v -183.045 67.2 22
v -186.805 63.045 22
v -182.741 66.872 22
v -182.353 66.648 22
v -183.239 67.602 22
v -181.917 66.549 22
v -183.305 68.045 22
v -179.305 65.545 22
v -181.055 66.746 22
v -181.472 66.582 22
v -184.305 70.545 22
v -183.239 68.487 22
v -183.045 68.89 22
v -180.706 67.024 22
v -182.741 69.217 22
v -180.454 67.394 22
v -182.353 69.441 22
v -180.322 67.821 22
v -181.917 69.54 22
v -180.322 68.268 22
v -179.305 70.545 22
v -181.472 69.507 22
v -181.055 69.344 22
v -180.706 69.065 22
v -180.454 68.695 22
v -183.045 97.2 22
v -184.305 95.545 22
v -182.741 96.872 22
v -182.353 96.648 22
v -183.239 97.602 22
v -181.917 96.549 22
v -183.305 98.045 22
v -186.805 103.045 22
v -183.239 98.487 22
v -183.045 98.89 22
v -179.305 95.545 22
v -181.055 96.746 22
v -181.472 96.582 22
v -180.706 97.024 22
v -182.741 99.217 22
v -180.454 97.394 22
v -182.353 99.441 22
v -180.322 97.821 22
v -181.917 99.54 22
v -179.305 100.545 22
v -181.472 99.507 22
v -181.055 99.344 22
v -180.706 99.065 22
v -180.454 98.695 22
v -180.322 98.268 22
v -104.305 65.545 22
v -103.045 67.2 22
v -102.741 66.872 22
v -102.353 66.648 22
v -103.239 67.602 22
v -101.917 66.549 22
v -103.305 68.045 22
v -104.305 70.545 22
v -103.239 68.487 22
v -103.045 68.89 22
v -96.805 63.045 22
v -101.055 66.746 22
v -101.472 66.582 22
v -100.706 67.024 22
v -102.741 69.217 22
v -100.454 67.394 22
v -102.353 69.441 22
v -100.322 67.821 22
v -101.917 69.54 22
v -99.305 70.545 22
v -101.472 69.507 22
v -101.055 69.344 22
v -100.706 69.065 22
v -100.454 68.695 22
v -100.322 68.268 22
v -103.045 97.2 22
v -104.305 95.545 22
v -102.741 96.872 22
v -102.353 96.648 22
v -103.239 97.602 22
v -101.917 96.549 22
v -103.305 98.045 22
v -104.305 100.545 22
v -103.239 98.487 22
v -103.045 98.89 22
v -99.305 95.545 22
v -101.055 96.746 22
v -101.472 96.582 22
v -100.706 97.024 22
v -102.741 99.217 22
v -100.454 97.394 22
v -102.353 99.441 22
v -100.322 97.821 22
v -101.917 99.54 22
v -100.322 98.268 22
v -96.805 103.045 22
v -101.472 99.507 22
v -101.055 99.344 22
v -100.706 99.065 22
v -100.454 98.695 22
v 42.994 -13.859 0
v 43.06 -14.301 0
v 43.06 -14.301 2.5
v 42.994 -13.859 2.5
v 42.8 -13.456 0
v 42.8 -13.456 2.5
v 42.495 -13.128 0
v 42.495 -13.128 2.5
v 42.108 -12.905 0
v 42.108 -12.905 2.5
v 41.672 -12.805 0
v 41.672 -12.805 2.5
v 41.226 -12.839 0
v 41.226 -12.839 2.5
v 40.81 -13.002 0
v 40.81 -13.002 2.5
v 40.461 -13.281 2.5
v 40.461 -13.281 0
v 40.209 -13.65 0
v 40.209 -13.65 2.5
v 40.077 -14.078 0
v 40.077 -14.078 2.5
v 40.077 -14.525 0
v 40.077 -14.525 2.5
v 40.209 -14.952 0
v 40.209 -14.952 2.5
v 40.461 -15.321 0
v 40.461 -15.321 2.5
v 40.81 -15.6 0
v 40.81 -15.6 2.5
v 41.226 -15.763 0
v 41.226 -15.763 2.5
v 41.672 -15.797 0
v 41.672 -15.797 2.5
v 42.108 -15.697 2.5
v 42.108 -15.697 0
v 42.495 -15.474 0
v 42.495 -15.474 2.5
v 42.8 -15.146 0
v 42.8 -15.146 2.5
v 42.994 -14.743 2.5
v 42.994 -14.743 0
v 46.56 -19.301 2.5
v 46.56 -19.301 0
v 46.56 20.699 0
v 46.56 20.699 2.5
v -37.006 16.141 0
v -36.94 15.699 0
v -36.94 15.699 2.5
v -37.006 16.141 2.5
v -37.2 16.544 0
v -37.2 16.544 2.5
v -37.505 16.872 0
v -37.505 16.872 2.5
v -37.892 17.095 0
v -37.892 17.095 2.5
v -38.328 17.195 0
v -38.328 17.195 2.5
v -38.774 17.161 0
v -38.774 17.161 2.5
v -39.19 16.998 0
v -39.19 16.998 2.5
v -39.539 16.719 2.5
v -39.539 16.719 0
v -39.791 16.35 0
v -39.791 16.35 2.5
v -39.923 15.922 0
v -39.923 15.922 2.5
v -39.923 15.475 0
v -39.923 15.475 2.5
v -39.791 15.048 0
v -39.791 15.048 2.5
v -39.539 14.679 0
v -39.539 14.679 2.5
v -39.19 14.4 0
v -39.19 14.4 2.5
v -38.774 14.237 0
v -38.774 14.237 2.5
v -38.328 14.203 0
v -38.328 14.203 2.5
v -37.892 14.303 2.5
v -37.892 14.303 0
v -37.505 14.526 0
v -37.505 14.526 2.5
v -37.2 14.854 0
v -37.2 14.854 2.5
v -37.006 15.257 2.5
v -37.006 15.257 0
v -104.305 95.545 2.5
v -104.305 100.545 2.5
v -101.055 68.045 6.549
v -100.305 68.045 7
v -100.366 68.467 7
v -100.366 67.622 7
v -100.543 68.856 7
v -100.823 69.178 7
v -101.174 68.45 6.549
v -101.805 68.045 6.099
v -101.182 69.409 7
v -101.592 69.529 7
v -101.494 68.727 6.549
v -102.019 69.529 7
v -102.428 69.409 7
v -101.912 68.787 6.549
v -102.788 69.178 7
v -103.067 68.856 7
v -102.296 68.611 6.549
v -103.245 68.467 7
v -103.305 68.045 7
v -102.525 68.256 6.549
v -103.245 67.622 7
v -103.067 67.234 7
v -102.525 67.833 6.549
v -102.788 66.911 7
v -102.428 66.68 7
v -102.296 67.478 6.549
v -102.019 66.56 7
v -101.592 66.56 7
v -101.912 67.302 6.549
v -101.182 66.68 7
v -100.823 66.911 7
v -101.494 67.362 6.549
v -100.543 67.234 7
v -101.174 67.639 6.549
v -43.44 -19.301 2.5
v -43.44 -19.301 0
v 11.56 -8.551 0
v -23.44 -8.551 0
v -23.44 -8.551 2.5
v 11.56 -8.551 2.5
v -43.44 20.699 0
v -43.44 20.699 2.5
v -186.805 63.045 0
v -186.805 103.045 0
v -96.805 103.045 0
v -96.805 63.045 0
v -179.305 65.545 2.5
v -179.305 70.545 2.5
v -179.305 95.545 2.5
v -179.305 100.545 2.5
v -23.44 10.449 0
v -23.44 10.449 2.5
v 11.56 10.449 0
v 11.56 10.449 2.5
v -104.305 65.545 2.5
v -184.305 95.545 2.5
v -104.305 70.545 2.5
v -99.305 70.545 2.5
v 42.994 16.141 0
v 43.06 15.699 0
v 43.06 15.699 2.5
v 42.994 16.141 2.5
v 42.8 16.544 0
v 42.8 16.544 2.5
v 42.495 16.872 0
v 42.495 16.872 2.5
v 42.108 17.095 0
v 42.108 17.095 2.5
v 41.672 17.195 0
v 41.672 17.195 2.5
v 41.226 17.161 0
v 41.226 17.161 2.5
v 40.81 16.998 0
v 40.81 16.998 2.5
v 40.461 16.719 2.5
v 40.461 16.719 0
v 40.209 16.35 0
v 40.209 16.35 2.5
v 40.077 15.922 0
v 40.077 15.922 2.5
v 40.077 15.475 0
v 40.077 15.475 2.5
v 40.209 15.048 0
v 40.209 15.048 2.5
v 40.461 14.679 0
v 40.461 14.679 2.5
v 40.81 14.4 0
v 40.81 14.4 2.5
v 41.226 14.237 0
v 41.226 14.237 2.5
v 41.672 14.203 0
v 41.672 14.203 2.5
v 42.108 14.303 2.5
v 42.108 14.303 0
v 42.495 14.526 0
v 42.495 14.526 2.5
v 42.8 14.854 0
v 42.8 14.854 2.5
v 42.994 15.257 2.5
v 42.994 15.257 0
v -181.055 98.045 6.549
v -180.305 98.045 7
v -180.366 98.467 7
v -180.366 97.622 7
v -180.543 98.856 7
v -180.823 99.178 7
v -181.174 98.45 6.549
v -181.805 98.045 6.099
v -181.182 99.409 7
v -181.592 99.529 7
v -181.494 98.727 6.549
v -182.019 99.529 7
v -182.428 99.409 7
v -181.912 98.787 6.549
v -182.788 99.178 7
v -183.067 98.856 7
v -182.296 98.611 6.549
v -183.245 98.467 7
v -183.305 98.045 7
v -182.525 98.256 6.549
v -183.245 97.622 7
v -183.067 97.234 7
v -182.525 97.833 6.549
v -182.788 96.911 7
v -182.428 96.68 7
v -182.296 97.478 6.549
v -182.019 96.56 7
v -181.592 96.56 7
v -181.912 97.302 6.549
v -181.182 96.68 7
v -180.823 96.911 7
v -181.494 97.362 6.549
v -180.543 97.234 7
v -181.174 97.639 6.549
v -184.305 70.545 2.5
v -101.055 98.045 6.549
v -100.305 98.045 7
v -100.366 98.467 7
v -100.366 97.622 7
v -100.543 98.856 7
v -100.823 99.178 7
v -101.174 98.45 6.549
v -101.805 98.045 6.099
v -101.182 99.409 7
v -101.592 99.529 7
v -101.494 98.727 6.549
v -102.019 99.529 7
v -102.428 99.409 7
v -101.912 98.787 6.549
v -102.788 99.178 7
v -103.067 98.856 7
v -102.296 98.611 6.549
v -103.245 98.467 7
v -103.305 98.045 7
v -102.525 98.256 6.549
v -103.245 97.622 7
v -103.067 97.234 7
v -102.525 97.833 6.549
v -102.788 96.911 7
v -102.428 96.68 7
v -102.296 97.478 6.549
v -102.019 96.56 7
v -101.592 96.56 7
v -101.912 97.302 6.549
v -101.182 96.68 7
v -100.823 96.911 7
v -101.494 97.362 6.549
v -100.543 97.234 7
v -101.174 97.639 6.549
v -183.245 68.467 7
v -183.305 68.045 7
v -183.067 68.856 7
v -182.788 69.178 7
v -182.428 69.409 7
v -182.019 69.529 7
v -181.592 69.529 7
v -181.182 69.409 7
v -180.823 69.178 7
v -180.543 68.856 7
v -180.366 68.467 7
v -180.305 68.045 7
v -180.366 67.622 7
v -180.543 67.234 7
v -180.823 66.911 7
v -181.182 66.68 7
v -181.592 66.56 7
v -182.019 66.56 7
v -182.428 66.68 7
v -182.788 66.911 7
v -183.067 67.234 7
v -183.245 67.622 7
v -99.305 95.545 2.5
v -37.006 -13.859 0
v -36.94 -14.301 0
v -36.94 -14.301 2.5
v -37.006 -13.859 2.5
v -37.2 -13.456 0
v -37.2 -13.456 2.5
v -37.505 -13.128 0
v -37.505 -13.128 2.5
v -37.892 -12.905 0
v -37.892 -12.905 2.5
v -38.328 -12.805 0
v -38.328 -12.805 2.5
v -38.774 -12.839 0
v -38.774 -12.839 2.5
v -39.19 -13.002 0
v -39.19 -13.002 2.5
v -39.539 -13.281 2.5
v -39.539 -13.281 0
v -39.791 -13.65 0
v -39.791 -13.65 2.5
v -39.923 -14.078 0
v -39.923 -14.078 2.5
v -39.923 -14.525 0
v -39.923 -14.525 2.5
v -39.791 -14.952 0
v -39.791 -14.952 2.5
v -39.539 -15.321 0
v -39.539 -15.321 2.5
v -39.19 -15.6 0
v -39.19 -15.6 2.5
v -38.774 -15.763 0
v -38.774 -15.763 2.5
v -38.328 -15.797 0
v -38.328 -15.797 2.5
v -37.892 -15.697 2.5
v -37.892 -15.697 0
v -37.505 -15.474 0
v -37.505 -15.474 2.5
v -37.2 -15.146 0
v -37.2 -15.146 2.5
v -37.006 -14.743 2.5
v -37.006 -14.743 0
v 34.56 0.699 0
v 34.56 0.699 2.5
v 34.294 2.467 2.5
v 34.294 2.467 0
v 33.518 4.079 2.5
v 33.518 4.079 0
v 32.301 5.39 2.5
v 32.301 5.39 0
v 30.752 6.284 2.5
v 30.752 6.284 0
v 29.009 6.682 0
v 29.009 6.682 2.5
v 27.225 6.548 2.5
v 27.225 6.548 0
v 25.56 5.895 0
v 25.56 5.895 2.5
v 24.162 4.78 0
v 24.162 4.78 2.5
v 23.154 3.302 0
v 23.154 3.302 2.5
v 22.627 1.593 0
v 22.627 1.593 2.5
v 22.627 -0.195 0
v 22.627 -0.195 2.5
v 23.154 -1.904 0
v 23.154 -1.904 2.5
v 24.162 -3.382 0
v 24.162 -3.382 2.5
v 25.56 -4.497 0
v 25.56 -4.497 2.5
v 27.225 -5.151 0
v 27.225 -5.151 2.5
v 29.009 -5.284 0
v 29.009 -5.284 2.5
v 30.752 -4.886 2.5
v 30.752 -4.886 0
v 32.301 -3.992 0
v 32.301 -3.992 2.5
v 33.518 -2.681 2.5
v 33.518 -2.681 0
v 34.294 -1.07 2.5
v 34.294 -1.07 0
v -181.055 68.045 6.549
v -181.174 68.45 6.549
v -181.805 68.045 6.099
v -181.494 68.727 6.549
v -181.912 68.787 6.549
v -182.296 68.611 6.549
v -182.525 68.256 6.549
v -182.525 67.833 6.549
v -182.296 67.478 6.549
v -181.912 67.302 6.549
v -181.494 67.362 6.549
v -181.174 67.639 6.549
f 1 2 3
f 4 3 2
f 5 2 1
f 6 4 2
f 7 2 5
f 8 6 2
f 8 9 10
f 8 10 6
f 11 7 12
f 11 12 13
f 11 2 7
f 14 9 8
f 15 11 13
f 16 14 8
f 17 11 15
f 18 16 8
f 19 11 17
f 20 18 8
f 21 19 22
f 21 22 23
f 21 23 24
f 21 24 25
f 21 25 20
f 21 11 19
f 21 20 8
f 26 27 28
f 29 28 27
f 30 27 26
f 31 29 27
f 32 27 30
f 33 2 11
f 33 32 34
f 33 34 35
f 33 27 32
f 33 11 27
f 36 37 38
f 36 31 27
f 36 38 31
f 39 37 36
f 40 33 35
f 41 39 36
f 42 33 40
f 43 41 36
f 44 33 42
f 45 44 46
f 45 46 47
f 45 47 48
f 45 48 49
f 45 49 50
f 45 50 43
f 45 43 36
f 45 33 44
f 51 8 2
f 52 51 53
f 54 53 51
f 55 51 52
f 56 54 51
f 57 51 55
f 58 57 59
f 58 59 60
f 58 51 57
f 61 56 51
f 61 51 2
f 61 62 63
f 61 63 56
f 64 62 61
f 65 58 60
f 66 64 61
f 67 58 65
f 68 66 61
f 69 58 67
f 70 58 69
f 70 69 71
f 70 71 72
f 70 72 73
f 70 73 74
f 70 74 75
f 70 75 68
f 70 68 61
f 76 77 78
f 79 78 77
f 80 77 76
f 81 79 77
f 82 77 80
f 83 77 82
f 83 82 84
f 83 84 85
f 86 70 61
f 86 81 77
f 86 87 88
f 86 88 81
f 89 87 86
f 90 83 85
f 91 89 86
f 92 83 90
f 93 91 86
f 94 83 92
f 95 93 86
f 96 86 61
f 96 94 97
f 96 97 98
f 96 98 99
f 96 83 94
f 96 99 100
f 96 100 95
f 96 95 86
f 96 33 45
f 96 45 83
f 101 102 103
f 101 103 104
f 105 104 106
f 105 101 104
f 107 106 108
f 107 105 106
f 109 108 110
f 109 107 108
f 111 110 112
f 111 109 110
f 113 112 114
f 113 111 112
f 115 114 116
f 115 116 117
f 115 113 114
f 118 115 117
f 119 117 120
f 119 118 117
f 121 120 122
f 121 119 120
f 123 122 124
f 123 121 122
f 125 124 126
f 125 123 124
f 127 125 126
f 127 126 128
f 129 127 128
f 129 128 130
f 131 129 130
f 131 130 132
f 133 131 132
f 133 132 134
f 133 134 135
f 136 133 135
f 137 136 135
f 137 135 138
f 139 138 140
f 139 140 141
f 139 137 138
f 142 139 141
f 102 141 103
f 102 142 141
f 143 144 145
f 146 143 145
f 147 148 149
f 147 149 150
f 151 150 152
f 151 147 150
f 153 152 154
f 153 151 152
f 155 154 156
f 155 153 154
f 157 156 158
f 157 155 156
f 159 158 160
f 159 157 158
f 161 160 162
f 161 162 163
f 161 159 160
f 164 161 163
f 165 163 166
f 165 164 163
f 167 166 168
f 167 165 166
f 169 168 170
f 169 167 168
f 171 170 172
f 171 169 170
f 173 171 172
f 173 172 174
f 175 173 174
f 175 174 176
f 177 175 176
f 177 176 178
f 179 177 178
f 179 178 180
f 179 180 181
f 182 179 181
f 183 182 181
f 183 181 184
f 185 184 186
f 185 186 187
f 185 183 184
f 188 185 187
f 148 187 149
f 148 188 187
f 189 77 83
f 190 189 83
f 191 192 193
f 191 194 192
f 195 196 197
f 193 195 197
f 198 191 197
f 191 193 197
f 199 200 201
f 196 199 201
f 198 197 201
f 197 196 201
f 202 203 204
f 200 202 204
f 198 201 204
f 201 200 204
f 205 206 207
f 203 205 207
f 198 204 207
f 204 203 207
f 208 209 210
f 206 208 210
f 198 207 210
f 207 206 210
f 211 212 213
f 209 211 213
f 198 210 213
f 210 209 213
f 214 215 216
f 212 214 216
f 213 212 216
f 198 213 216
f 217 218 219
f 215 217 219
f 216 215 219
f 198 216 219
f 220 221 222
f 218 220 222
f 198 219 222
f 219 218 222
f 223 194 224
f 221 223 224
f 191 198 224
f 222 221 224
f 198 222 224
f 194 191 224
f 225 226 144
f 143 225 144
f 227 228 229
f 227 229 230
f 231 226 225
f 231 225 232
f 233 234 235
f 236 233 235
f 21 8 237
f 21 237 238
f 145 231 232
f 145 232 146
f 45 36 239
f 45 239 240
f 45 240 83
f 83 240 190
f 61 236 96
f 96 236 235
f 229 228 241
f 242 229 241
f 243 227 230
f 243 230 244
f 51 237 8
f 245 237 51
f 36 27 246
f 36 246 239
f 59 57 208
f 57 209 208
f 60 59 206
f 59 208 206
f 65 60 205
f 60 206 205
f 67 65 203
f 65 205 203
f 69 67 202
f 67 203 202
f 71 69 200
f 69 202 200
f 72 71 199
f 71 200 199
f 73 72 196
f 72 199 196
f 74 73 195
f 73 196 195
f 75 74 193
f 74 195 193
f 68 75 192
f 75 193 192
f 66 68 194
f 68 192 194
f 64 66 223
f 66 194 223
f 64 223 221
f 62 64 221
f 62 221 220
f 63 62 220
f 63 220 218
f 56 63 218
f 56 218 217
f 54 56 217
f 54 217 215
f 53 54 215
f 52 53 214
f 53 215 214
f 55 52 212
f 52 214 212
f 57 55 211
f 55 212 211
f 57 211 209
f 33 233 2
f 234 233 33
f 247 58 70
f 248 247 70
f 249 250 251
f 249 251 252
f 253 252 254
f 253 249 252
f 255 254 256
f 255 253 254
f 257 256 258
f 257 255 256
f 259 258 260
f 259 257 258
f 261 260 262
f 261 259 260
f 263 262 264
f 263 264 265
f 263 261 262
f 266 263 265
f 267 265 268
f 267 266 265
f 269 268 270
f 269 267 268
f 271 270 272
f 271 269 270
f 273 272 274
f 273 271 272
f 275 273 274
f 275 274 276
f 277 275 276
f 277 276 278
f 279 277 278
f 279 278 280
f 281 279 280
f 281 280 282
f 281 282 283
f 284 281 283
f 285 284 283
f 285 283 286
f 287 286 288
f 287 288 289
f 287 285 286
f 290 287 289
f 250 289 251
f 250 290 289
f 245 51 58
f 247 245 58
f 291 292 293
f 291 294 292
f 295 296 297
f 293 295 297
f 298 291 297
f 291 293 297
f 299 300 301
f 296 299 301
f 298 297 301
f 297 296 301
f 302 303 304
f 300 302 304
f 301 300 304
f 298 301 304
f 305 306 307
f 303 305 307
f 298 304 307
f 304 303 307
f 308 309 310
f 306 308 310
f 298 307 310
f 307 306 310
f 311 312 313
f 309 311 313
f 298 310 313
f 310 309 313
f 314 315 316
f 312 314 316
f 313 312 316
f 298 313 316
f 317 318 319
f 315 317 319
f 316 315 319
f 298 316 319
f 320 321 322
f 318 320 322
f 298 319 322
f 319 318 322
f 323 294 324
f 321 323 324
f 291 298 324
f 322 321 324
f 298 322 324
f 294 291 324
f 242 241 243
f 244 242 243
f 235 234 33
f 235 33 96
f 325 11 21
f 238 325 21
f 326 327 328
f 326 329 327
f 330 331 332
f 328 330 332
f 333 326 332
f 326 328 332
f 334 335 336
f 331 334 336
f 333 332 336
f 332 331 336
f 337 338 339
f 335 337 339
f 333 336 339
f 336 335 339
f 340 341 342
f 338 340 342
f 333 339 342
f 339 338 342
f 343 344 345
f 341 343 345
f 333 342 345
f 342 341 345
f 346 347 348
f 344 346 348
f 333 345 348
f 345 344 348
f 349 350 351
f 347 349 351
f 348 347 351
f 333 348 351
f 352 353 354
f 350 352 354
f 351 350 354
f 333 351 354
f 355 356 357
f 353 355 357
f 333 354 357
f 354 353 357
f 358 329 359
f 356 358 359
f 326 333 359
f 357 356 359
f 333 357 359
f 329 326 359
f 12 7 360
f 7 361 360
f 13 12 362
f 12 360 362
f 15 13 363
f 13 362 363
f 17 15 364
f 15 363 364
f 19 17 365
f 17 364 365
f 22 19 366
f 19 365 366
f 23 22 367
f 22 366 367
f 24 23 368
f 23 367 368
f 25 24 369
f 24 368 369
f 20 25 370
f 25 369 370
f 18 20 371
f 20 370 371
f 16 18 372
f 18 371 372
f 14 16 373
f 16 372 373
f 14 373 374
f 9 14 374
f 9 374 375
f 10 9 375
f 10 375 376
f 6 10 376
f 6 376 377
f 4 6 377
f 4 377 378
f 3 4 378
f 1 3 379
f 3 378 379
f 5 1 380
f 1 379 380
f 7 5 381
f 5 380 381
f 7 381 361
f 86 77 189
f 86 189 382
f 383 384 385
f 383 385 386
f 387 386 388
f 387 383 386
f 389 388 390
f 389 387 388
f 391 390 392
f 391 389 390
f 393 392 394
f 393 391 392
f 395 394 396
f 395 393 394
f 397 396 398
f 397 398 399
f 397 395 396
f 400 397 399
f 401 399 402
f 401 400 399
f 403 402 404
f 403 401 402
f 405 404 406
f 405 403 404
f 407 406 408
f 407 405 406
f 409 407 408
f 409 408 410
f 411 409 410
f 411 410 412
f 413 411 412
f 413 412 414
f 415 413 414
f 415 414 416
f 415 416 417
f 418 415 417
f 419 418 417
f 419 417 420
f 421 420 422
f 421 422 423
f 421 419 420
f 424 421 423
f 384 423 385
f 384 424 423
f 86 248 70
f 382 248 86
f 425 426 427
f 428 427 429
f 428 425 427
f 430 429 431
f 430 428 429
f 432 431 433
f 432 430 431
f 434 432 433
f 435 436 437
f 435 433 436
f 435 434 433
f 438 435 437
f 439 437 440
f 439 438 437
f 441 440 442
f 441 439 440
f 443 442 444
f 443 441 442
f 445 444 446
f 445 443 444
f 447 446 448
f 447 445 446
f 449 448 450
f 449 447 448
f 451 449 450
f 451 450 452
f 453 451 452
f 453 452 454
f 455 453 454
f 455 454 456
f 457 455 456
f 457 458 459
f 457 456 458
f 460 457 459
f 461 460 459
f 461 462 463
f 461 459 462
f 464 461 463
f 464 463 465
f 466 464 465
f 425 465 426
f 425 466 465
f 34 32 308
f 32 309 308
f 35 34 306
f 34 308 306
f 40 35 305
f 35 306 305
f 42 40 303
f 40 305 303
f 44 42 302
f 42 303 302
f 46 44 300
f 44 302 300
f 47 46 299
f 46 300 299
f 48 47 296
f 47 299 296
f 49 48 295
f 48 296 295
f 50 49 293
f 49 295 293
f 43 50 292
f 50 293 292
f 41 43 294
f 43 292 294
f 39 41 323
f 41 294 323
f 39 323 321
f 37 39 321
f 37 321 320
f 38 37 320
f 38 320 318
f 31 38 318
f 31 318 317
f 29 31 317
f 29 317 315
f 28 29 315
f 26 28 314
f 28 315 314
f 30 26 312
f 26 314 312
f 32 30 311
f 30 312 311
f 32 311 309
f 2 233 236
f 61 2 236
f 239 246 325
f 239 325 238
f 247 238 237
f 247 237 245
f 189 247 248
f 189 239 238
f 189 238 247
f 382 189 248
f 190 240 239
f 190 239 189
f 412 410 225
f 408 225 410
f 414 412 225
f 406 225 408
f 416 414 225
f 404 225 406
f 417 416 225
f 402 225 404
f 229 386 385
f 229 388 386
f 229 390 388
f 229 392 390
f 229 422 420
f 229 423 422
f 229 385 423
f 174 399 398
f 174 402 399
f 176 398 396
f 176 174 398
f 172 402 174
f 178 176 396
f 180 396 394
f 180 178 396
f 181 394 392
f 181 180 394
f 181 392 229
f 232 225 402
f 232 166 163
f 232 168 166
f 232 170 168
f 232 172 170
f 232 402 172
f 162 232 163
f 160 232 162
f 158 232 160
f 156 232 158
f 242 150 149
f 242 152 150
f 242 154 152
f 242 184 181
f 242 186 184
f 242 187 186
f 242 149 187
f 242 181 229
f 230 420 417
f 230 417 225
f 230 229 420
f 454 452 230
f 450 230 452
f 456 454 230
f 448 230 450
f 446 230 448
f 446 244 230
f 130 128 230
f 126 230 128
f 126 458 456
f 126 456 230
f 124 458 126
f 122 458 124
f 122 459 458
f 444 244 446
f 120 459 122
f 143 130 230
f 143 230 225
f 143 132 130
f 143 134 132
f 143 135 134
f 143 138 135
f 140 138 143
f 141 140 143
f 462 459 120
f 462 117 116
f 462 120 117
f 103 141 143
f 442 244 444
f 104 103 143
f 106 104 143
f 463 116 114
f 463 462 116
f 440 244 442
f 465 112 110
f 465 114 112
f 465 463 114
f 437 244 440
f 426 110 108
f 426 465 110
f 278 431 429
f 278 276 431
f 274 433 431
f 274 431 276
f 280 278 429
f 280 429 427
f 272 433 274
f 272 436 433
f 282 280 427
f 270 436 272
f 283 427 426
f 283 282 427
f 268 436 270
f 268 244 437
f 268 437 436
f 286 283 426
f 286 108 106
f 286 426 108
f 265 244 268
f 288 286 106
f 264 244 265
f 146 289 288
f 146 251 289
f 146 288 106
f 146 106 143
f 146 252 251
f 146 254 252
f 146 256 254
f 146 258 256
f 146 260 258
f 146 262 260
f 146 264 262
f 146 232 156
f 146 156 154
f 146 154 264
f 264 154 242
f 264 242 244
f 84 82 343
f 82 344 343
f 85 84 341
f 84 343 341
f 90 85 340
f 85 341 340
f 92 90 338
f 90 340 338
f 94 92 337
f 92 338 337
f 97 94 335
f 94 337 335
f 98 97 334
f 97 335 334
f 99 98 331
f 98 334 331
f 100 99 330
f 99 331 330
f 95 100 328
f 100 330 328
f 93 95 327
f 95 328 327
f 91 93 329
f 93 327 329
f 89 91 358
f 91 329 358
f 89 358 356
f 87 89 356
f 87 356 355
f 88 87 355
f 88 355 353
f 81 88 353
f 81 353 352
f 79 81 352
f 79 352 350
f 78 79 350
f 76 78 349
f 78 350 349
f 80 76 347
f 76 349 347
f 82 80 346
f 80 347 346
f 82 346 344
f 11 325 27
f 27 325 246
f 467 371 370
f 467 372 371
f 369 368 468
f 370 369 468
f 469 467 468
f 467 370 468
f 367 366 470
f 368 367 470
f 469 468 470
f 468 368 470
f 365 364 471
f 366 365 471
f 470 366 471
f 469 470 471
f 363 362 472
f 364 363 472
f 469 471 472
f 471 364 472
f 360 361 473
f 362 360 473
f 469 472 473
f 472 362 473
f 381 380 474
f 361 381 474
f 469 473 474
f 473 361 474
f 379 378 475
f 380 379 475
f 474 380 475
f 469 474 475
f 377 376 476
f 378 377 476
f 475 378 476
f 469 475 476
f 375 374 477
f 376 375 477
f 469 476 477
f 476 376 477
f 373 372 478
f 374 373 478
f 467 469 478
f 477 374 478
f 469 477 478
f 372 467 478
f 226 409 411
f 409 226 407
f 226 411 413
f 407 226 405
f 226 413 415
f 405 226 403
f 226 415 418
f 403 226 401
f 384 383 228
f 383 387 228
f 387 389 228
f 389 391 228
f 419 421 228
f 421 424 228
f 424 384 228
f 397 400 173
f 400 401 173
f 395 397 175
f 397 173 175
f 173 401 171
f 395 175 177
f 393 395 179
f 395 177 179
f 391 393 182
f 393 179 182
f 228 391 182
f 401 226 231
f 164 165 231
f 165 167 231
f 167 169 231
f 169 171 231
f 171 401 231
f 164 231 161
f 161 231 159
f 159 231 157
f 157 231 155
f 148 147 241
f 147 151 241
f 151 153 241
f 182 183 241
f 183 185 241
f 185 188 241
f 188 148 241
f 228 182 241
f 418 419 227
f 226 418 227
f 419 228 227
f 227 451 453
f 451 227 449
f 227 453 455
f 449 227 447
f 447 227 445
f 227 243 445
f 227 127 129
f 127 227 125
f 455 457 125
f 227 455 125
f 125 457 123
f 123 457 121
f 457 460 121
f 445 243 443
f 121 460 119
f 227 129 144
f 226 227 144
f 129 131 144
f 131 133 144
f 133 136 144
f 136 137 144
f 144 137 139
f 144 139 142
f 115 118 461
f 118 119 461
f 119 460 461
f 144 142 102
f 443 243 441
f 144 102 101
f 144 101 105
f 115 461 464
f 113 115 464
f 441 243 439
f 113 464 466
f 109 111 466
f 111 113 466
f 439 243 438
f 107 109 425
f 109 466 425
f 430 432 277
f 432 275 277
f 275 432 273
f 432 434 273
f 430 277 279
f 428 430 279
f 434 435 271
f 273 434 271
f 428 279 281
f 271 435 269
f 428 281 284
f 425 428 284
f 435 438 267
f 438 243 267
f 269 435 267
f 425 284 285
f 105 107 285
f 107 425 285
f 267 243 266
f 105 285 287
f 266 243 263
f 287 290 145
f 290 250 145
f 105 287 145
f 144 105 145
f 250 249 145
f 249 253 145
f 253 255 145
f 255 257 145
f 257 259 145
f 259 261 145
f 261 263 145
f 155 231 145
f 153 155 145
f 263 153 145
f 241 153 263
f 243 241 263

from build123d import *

# Parameters (mm, degrees)
F0_W     = 90
F0_H     = 40
F1_DEPTH = 22
F2_T     = -2.5
F3_W     = 90
F3_H     = 40
F3_R     = 1.5
F3_W_2   = 35
F3_H_2   = 19
F4_DEPTH = 2.5
F5_R     = 6
F6_DEPTH = 25
F7_W     = 5
F7_H     = 5
F8_DEPTH = 22
F9_D     = 3
F9_DEPTH = 15
F9_TIP   = 0.9012909285


with BuildPart() as f1:
    # F0 (on Top) → F1 (new body)
    with BuildSketch(Plane.XY):
        with Locations((-141.8053229451, 83.0445581675)):
            Rectangle(F0_W, F0_H)
    extrude(amount=F1_DEPTH)

    # F2
    f2_openings = [f1.faces().sort_by_distance(p)[0] for p in [
        (-141.805323, 83.044558, 22),
    ]]
    offset(amount=F2_T, openings=f2_openings)

    # F7 (on face) → F8 (join)
    with BuildSketch(Plane.XY.offset(22)):
        with Locations((-181.8053229451, 98.0445581675)):
            Rectangle(F7_W, F7_H)
        with Locations((-101.8053229451, 98.0445581675)):
            Rectangle(F7_W, F7_H)
        with Locations((-101.8053229451, 68.0445581675)):
            Rectangle(F7_W, F7_H)
        with Locations((-181.8053229451, 68.0445581675)):
            Rectangle(F7_W, F7_H)
    extrude(amount=-F8_DEPTH)

    # F9
    with Locations(Plane.XY.offset(22)):
        with Locations((-181.8053229451, 98.0445581675), (-181.8053229451, 68.0445581675), (-101.8053229451, 98.0445581675), (-101.8053229451, 68.0445581675)):
            Hole(F9_D / 2, depth=F9_DEPTH)
            with Locations((0, 0, -(F9_DEPTH + F9_TIP / 2))):  # 118° drill point
                Cone(0, F9_D / 2, F9_TIP, mode=Mode.SUBTRACT)


with BuildPart() as f4:
    # F3 (on Top) → F4 (new body)
    with BuildSketch(Plane.XY):
        with Locations((1.5602434054, 0.6989241838)):
            Rectangle(F3_W, F3_H)
        with Locations((-38.4397565946, -14.3010758162)):
            Circle(F3_R, mode=Mode.SUBTRACT)
        with Locations((41.5602434054, -14.3010758162)):
            Circle(F3_R, mode=Mode.SUBTRACT)
        with Locations((-5.9397565946, 0.9489241838)):
            Rectangle(F3_W_2, F3_H_2, mode=Mode.SUBTRACT)
        with Locations((-38.4397565946, 15.6989241838)):
            Circle(F3_R, mode=Mode.SUBTRACT)
        with Locations((41.5602434054, 15.6989241838)):
            Circle(F3_R, mode=Mode.SUBTRACT)
    extrude(amount=F4_DEPTH)

    # F5 (on face) → F6 (cut)
    with BuildSketch(Plane.XY):
        with Locations((28.5602434054, 0.6989241838)):
            Circle(F5_R)
    extrude(amount=F6_DEPTH, mode=Mode.SUBTRACT)


solid = Compound([f1.part, f4.part])
